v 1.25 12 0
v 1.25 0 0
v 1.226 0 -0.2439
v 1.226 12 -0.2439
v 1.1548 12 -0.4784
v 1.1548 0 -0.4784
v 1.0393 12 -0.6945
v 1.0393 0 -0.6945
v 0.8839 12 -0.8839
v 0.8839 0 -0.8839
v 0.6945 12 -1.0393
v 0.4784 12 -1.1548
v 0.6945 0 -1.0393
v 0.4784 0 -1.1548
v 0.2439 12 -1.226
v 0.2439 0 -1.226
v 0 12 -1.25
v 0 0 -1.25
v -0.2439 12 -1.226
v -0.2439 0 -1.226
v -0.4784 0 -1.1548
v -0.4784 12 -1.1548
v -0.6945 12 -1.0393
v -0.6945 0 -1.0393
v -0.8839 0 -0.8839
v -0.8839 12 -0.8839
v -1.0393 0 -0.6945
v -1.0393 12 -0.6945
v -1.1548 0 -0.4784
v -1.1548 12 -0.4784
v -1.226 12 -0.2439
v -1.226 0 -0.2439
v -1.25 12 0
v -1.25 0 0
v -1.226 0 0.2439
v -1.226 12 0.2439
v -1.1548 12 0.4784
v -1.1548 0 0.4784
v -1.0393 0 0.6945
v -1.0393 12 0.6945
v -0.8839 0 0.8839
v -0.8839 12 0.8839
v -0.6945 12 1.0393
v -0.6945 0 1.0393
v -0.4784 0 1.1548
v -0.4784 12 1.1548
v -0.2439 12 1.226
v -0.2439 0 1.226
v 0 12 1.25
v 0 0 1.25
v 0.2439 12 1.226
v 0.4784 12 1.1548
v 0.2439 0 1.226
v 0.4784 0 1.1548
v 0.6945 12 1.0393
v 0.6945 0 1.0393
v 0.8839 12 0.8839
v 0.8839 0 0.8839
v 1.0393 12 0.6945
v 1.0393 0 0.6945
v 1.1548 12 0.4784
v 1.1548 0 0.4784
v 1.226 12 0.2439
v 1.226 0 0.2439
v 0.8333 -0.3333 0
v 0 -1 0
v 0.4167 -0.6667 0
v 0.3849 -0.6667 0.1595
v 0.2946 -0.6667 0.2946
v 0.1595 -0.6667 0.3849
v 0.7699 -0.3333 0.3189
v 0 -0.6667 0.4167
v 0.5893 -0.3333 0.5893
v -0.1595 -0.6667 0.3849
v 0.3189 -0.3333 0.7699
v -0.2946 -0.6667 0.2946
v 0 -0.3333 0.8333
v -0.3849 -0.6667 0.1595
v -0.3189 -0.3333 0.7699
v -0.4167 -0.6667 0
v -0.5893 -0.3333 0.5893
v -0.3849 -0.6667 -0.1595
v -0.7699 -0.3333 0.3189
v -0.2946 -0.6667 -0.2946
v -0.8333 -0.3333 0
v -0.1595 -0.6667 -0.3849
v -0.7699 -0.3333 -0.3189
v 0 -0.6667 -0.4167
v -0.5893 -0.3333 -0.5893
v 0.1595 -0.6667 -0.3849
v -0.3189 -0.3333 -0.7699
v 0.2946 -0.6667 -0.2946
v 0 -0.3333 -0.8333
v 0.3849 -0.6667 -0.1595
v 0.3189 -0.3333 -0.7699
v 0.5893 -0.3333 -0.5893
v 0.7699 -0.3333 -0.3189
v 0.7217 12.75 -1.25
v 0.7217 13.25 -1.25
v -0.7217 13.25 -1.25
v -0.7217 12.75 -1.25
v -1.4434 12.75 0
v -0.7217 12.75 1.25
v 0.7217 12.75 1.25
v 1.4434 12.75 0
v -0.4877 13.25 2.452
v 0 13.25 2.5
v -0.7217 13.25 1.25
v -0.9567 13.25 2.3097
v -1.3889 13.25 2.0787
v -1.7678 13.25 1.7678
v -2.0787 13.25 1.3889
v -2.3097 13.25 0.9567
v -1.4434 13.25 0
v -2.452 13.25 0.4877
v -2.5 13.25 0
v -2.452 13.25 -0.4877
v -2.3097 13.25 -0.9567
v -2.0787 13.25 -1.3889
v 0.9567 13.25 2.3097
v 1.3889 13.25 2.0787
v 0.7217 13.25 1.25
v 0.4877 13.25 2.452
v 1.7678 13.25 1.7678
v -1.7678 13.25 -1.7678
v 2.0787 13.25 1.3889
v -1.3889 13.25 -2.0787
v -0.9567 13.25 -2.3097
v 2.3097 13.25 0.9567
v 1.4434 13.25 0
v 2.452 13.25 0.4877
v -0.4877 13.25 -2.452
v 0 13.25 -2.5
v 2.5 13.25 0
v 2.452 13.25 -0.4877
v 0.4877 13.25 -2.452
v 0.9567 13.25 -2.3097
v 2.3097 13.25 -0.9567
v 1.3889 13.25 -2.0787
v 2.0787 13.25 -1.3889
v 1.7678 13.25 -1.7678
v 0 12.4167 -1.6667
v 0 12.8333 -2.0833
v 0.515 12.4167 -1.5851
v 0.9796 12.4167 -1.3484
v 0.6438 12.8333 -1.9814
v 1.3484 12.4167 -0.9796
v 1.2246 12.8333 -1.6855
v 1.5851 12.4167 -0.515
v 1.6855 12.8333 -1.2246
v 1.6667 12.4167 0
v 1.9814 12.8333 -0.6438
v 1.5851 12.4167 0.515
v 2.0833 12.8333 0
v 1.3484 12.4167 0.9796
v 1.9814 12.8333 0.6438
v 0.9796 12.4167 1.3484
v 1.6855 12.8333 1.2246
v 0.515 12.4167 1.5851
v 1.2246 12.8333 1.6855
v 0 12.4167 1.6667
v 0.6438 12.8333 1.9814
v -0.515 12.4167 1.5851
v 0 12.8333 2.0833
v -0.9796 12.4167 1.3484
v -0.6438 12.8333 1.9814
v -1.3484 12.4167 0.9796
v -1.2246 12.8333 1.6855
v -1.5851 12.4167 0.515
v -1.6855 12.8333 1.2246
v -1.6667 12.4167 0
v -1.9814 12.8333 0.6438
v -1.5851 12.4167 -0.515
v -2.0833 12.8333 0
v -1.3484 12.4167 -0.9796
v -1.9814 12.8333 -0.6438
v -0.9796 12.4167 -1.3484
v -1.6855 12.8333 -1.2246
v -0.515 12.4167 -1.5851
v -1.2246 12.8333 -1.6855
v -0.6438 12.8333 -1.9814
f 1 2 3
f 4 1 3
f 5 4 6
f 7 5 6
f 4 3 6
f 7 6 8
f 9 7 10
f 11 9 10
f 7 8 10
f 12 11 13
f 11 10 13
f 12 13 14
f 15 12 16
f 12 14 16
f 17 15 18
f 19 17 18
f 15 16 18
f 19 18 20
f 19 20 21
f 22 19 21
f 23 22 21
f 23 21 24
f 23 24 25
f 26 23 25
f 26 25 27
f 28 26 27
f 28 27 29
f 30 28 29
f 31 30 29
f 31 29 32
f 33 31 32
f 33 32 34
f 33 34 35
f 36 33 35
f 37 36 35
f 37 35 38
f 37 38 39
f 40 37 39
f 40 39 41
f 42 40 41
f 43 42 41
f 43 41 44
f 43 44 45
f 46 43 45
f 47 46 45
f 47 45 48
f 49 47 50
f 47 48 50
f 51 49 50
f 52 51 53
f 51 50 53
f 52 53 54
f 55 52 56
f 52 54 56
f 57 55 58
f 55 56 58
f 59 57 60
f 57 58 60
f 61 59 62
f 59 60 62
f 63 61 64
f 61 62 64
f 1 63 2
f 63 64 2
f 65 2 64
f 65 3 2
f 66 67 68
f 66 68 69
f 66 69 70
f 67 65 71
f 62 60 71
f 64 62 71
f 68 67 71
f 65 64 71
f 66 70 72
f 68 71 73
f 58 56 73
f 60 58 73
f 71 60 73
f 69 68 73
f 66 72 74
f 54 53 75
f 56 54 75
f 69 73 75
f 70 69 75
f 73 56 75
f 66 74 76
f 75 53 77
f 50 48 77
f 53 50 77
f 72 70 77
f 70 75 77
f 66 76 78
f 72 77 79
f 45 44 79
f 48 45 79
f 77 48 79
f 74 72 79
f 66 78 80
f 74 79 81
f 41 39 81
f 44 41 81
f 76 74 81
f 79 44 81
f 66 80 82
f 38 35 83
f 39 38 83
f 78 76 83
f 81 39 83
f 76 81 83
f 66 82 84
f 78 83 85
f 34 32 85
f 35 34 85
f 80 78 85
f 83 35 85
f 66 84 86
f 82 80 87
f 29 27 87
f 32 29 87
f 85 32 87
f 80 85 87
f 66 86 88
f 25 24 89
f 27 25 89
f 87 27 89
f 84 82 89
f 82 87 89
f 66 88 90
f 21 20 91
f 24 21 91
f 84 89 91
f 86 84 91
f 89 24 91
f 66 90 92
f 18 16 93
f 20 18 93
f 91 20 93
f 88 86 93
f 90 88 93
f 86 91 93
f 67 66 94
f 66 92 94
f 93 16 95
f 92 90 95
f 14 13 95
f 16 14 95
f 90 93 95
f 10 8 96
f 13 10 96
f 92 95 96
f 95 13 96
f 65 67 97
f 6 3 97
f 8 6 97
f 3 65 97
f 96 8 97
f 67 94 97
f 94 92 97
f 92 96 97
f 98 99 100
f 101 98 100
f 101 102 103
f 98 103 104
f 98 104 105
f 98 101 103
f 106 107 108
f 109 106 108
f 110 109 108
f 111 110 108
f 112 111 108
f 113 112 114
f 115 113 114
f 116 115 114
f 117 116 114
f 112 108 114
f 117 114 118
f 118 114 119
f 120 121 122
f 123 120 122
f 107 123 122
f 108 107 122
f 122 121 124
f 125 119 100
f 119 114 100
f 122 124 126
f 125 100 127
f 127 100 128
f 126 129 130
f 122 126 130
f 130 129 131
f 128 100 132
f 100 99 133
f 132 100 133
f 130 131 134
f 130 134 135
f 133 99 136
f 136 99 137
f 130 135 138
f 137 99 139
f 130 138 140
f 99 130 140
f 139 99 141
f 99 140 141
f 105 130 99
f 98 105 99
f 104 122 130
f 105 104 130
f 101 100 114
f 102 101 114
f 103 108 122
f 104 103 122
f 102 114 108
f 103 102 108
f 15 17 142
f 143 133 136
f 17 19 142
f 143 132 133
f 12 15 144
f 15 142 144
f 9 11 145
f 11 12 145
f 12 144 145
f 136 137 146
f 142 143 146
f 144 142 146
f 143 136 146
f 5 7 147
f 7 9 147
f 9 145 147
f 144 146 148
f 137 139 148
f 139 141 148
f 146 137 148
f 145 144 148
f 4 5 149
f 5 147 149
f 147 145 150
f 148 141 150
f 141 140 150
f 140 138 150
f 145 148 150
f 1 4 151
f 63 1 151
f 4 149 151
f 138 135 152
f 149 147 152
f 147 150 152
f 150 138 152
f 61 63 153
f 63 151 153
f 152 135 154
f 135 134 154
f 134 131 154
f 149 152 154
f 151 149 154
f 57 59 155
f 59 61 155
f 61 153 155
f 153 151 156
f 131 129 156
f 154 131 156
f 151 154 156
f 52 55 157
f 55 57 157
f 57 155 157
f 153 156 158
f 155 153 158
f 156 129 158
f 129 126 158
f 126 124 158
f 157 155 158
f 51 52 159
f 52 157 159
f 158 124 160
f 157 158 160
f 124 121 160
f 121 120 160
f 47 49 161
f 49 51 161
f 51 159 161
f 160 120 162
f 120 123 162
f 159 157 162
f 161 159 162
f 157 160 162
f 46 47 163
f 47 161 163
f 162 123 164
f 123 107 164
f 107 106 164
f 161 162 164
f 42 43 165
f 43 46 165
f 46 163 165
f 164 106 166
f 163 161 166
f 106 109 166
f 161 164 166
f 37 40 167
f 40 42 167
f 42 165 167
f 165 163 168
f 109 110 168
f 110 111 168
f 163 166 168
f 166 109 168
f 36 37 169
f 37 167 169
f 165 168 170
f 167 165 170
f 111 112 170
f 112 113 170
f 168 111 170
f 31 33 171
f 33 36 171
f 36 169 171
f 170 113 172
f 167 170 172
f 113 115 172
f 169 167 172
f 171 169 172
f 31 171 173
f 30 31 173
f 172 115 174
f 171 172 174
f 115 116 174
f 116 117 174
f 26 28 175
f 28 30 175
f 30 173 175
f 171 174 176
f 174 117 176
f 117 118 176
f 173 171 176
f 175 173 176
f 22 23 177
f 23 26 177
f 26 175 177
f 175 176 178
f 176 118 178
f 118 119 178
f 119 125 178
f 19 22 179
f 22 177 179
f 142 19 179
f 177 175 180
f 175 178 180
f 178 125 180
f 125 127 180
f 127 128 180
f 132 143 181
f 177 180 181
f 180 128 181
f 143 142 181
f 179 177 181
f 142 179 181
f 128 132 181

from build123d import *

# Parameters (mm, degrees)
CROQUIS1_R              = 1.25
SALIENTE_EXTRUIR1_DEPTH = 12
CORTAR_EXTRUIR1_DEPTH   = 0.5


with BuildPart() as part:
    # Croquis1 → Saliente-Extruir1 (new body)
    with BuildSketch(Plane(origin=(0, 0, 0), x_dir=(1, 0, 0), z_dir=(0, 1, 0))):
        Circle(CROQUIS1_R)
    extrude(amount=SALIENTE_EXTRUIR1_DEPTH)

    # Croquis2 one side → Revolución1 (revolve)
    with BuildSketch(Plane(origin=(0, 0, 0), x_dir=(0, 0, -1), z_dir=(1, 0, 0))):
        Polygon((0, 13.25), (0, 12), (1.25, 12), (2.5, 13.25), align=None)
    revolve(axis=Axis((0, 13.25, 0), (0, -1, 0)))

    # Croquis3 → Cortar-Extruir1 (cut)
    with BuildSketch(Plane(origin=(0, 13.25, 0), x_dir=(1, 0, 0), z_dir=(0, 1, 0))):
        Polygon((1.443375673, 0), (0.721687836, 1.25), (-0.721687836, 1.25), (-1.443375673, 0), (-0.721687836, -1.25), (0.721687836, -1.25), align=None)
    extrude(amount=-CORTAR_EXTRUIR1_DEPTH, mode=Mode.SUBTRACT)

    # Croquis4 one side → Revolución2 (revolve)
    with BuildSketch(Plane.XY):
        Polygon((0, 0), (0, -1), (1.25, 0), align=None)
    revolve(axis=Axis((0, 0, 0), (0, -1, 0)))


solid = part.part
